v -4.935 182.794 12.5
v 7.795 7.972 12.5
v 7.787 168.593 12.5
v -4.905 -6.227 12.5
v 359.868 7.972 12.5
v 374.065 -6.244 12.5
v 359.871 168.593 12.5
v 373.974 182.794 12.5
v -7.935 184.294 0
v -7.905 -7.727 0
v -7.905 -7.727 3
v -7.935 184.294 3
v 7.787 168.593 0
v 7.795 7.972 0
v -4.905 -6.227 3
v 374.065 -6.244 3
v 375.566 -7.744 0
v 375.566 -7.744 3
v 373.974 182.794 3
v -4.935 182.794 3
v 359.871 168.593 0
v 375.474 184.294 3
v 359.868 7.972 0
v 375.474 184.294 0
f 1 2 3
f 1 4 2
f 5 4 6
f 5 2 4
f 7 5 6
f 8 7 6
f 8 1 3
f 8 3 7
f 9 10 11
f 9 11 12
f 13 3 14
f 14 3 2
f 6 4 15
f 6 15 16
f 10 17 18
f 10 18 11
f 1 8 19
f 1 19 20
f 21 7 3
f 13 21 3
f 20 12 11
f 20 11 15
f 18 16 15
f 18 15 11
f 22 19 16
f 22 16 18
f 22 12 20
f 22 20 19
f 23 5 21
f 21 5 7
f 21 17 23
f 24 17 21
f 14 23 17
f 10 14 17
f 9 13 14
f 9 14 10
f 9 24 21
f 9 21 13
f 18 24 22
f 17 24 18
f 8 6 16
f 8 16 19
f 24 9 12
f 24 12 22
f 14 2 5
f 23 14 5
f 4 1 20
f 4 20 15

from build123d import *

# Parameters (mm, degrees)
EXTRUDE_1_DEPTH       = 16
CUT_EXTRUDE_1_DEPTH   = 13
CUT_EXTRUDE_1_2_DEPTH = 3.5
CUT_EXTRUDE_2_DEPTH   = 14.5


with BuildPart() as part:
    # Model → 凸台-拉伸1 (new body)
    with BuildSketch(Plane.XY):
        Polygon((-7.935386074, 184.294), (-7.904930268, -7.726795577), (375.566, -7.74368854), (375.473711158, 184.294), align=None)
    extrude(amount=EXTRUDE_1_DEPTH)

    # 草图3 → Cut-Extrude 1 (cut)
    # profile 1 of 2: a face of its own
    with BuildSketch(Plane.XY.offset(16)):
        Polygon((-6.404930287, -7.726557667), (-6.435386093, 184.29423791), (-4.935386112, 184.29447582), (-4.904930306, -7.726319757), align=None)
    # profile 2 of 2: a face of its own
    with BuildSketch(Plane.XY.offset(16)):
        Polygon((375.473711158, 184.294), (-7.935386074, 184.294), (-7.904930268, -7.726795577), (375.566, -7.74368854), align=None)
        Polygon((373.97443185, 182.794), (-6.435148145, 182.794), (-6.405168149, -6.226861644), (374.06527893, -6.243622428), align=None, mode=Mode.SUBTRACT)
    extrude(amount=-CUT_EXTRUDE_1_DEPTH, mode=Mode.SUBTRACT)

    # 草图3<5> → Cut-Extrude 1 2 (cut)
    with BuildSketch(Plane.XY.offset(16)):
        Polygon((-6.435148145, 182.794), (-6.405168149, -6.226861644), (374.06527893, -6.243622428), (373.97443185, 182.794), align=None)
    extrude(amount=-CUT_EXTRUDE_1_2_DEPTH, mode=Mode.SUBTRACT)

    # 草图4 → 切除-拉伸2 (cut)
    with BuildSketch(Plane.XY.offset(12.5)):
        Polygon((7.7946046, 7.972254), (359.86752, 7.972254), (359.870508087, 168.593), (7.787335087, 168.593), align=None)
    extrude(amount=-CUT_EXTRUDE_2_DEPTH, mode=Mode.SUBTRACT)


solid = part.part
